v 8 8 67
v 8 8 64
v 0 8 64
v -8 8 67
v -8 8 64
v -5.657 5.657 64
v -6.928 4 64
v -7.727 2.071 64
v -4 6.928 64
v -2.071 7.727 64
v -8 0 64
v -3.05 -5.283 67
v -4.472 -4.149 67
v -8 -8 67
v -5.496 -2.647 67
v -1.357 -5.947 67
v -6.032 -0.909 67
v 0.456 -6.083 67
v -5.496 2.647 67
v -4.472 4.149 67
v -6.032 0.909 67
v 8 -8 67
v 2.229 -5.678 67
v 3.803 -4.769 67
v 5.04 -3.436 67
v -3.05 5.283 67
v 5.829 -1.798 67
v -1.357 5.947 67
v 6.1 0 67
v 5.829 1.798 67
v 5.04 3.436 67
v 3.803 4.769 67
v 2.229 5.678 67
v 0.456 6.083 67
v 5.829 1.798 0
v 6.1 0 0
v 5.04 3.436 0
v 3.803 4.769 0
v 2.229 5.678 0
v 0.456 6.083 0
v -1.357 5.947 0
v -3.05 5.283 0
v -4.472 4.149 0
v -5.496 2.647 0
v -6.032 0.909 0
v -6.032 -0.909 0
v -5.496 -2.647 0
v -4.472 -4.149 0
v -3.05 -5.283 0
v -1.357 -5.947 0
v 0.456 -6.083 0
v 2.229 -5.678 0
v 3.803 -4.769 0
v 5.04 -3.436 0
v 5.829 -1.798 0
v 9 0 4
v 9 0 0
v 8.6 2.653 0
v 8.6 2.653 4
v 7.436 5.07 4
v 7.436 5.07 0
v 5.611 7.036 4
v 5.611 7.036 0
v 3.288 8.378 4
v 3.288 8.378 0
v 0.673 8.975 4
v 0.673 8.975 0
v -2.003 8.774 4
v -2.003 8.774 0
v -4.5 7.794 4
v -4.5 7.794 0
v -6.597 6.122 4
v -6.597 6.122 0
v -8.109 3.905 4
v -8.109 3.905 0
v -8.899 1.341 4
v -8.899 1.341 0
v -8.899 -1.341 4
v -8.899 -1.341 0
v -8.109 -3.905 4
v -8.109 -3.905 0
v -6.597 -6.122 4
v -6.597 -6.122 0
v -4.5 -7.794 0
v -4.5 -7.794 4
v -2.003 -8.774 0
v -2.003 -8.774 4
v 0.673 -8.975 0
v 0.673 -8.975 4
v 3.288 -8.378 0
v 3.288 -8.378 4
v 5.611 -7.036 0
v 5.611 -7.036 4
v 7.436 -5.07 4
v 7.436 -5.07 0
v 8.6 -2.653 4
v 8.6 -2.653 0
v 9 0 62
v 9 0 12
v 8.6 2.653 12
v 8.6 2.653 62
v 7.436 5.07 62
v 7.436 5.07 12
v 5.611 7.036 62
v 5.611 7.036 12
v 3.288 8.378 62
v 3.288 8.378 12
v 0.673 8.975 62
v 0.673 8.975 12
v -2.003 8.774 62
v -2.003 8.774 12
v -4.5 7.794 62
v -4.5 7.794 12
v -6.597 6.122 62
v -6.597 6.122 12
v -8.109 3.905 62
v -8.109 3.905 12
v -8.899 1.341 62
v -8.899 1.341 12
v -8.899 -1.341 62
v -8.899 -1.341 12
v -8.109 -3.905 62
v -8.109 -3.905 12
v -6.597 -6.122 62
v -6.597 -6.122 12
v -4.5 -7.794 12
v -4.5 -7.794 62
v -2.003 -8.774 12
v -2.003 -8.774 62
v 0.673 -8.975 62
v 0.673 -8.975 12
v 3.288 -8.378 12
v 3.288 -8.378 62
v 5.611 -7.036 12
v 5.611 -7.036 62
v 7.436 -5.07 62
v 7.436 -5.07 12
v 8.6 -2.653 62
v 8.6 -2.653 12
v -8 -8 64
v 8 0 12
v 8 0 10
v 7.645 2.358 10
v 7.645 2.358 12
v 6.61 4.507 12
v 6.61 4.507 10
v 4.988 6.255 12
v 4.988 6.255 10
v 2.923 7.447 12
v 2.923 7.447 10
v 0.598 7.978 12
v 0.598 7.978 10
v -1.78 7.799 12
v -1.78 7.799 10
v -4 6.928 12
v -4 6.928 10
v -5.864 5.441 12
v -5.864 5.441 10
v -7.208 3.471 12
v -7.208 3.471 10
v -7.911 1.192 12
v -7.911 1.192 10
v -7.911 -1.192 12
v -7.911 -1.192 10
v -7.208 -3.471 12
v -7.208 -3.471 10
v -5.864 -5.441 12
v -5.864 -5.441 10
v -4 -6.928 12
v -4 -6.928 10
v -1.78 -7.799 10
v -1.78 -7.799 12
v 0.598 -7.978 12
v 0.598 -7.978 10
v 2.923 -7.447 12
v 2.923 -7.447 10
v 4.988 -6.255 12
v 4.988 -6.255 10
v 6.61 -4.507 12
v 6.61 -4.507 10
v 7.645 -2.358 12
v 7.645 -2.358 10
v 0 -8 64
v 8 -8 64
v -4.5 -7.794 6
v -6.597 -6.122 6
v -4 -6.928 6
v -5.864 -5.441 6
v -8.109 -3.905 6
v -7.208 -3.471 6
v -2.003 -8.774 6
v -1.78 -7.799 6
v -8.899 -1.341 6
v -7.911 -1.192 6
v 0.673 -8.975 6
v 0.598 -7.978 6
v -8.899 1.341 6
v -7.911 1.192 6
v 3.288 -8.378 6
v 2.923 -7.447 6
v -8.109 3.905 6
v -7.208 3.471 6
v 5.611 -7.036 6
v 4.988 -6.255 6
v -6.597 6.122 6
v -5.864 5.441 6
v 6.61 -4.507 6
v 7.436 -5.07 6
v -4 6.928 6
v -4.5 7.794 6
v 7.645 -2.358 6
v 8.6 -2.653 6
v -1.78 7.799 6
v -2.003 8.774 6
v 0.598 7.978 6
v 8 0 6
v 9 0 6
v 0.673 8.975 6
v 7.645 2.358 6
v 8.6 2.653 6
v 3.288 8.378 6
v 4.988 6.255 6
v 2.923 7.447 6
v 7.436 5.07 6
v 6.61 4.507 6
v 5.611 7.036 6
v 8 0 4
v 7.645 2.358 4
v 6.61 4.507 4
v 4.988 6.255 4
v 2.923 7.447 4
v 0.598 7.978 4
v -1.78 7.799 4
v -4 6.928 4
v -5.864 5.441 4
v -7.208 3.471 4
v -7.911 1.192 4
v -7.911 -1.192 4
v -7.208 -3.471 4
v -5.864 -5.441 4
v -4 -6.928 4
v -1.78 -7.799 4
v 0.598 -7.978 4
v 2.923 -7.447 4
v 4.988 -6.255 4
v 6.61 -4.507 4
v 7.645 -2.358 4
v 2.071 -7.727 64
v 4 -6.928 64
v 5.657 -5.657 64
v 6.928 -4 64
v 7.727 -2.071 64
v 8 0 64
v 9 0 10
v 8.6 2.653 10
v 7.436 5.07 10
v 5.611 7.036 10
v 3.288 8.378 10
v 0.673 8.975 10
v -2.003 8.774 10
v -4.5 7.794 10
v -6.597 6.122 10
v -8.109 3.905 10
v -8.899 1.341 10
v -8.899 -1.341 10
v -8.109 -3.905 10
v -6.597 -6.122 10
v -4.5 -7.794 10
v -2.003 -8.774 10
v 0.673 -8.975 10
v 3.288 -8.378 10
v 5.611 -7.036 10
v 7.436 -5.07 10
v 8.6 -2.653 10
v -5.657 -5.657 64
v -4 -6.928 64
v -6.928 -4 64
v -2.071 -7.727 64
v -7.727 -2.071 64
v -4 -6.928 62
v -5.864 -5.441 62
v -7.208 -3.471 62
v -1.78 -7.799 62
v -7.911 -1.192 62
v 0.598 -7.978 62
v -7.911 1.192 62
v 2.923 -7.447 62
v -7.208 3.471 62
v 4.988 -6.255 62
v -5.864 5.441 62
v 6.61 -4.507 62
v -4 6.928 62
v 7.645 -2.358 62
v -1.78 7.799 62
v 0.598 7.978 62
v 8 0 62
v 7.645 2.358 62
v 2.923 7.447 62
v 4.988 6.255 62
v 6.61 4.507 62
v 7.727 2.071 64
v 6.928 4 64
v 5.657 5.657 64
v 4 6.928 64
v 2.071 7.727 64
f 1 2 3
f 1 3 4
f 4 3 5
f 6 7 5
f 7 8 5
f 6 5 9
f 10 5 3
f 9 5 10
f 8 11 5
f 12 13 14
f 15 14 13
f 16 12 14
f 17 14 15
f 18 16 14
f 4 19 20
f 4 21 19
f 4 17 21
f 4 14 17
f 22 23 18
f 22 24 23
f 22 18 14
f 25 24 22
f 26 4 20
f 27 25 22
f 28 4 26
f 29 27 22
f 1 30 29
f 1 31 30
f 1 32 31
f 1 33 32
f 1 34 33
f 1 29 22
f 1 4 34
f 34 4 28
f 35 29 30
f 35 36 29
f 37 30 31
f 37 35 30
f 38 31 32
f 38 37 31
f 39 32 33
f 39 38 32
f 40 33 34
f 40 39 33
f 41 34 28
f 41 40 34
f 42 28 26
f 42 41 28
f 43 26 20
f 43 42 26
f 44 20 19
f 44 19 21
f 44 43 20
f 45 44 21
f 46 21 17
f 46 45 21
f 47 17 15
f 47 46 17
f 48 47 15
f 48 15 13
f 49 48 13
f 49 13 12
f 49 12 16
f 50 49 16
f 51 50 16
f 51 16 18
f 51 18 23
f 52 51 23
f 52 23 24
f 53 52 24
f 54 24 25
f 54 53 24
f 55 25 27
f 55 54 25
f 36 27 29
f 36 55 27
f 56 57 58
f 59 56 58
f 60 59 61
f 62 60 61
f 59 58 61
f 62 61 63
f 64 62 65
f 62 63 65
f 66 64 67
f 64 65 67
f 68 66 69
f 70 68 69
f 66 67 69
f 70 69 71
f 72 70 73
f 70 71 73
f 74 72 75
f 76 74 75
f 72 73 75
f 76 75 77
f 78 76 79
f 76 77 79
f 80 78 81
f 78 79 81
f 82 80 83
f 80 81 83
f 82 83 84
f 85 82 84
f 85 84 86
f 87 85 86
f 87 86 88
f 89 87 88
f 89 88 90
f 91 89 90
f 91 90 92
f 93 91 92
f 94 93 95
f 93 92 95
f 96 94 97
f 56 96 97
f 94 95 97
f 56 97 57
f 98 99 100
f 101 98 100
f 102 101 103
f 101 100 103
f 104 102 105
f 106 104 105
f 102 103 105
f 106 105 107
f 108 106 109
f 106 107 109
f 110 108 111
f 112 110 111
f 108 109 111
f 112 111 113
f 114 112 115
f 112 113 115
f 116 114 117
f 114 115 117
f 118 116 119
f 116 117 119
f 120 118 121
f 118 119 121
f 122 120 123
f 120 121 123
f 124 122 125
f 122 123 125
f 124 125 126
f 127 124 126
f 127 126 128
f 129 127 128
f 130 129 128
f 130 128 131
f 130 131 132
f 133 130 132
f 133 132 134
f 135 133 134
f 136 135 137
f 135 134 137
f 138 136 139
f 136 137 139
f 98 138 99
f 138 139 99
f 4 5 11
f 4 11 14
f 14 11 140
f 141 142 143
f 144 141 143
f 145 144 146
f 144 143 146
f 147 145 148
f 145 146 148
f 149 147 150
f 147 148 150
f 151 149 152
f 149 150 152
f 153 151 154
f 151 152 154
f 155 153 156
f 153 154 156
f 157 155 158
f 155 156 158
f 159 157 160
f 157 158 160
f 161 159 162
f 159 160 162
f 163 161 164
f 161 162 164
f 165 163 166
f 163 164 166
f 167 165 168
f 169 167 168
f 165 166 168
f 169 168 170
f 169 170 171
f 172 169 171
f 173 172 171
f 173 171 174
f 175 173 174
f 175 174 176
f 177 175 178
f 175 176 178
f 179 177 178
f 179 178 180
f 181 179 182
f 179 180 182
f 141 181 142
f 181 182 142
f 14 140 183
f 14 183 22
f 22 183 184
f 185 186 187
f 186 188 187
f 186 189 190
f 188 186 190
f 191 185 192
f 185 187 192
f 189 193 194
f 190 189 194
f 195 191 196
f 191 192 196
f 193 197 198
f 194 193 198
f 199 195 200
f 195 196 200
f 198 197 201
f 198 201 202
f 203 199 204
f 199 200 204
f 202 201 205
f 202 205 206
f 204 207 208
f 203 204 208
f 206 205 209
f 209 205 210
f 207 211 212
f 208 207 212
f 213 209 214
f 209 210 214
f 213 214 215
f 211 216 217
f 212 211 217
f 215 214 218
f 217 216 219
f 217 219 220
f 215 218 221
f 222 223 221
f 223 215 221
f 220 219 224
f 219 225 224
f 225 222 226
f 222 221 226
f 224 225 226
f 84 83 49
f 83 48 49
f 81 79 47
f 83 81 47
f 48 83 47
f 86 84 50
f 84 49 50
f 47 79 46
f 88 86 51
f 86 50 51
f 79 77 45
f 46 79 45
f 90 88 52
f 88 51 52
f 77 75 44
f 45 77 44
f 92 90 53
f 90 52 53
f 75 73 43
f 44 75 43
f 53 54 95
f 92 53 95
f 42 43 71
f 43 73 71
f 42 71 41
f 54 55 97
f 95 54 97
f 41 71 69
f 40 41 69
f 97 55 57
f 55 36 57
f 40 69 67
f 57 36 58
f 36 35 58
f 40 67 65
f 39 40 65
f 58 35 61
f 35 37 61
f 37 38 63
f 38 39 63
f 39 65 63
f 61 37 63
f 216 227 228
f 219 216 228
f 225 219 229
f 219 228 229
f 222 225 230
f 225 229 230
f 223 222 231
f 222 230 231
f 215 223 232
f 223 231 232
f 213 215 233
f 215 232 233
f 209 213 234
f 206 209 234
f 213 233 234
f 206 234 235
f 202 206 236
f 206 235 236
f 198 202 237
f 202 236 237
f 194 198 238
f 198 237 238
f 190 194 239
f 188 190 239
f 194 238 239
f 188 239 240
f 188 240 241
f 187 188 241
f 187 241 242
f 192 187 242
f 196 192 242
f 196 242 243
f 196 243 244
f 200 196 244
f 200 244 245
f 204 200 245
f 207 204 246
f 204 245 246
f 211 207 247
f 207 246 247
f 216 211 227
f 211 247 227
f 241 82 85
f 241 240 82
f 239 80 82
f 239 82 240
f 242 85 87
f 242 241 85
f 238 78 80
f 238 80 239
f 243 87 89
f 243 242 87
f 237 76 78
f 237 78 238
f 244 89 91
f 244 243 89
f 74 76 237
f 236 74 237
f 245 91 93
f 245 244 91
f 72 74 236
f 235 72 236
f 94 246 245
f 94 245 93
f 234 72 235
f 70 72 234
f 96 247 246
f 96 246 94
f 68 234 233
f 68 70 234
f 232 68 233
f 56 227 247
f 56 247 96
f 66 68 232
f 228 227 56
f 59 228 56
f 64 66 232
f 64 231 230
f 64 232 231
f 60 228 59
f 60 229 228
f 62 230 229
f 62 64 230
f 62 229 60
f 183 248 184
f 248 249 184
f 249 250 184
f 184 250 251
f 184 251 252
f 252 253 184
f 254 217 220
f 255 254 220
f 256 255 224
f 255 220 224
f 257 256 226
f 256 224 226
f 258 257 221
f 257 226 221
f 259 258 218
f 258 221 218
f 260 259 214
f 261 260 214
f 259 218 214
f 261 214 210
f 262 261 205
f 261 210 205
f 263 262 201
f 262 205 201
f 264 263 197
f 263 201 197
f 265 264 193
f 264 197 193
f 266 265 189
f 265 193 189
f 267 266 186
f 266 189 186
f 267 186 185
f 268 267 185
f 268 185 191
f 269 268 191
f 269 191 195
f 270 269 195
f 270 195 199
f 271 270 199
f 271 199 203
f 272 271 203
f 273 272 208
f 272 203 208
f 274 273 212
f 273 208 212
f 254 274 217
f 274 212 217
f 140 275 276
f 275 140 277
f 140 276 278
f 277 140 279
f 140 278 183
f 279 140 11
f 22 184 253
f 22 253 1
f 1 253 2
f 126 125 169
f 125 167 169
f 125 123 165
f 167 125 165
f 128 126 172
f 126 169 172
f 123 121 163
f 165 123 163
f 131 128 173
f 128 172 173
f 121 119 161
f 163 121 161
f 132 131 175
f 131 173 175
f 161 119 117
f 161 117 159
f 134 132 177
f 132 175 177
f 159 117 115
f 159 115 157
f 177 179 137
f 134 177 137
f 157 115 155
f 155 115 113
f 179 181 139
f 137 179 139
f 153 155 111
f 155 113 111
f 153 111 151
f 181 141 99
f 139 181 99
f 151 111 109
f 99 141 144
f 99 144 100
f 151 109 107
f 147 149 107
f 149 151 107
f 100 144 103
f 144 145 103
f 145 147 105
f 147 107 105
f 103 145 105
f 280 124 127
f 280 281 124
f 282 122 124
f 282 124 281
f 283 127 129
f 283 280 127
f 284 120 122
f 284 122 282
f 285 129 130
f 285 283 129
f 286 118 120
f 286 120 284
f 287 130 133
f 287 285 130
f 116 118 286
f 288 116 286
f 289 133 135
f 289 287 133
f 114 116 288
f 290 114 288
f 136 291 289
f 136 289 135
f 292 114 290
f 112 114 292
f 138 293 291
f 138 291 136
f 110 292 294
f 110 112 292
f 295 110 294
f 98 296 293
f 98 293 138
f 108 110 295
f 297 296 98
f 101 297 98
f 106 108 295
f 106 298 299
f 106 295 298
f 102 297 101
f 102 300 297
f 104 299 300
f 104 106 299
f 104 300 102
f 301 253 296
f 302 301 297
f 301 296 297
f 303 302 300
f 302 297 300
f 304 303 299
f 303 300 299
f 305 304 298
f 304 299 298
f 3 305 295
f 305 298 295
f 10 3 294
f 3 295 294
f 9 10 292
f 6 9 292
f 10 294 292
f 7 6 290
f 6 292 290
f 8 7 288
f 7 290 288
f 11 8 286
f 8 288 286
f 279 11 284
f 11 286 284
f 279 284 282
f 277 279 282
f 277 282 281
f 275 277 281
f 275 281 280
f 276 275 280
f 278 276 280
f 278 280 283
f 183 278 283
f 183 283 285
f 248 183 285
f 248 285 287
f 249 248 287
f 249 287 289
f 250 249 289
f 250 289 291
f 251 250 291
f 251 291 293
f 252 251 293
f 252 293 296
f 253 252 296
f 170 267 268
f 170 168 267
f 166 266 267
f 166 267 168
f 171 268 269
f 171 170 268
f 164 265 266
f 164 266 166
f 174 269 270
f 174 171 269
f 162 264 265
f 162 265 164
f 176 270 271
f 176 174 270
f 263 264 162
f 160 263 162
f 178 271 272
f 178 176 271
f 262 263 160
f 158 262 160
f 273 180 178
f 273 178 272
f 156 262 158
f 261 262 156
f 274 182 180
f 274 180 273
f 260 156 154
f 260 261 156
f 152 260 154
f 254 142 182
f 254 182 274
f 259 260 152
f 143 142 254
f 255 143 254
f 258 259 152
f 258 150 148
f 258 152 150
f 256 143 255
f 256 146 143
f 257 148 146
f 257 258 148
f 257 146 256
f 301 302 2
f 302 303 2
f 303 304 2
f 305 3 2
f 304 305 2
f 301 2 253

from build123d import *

# Parameters (mm, degrees)
F0_R      = 9
F0_R_2    = 6.1
F1_DEPTH  = 4
F2_R      = 8
F2_R_2    = 6.1
F3_DEPTH  = 2
F4_R      = 9
F4_R_2    = 8
F4_R_3    = 6.1
F5_DEPTH  = 4
F6_R      = 8
F6_R_2    = 6.1
F7_DEPTH  = 2
F8_R      = 9
F8_R_2    = 8
F8_R_3    = 6.1
F9_DEPTH  = 50
F10_R     = 8
F10_R_2   = 6.1
F11_DEPTH = 2
F12_R     = 6.1
F13_DEPTH = 3


with BuildPart() as f1:
    # F0 (on Top) → F1 (new body)
    with BuildSketch(Plane.XY):
        Circle(F0_R)
        Circle(F0_R_2, mode=Mode.SUBTRACT)
    extrude(amount=F1_DEPTH)

    # F2 (on face) → F3 (join)
    with BuildSketch(Plane.XY.offset(4)):
        Circle(F2_R)
        Circle(F2_R_2, mode=Mode.SUBTRACT)
    extrude(amount=F3_DEPTH)

    # F4 (on face) → F5 (join)
    with BuildSketch(Plane.XY.offset(6)):
        Circle(F4_R)
        Circle(F4_R_2, mode=Mode.SUBTRACT)
        Circle(F4_R_2)
        Circle(F4_R_3, mode=Mode.SUBTRACT)
    extrude(amount=F5_DEPTH)

    # F6 (on face) → F7 (join)
    with BuildSketch(Plane.XY.offset(10)):
        Circle(F6_R)
        Circle(F6_R_2, mode=Mode.SUBTRACT)
    extrude(amount=F7_DEPTH)

    # F8 (on face) → F9 (join)
    with BuildSketch(Plane.XY.offset(12)):
        Circle(F8_R)
        Circle(F8_R_2, mode=Mode.SUBTRACT)
        Circle(F8_R_2)
        Circle(F8_R_3, mode=Mode.SUBTRACT)
    extrude(amount=F9_DEPTH)

    # F10 (on face) → F11 (join)
    with BuildSketch(Plane.XY.offset(62)):
        Circle(F10_R)
        Circle(F10_R_2, mode=Mode.SUBTRACT)
    extrude(amount=F11_DEPTH)

    # F12 (on face) → F13 (join)
    with BuildSketch(Plane.XY.offset(64)):
        with BuildLine():
            ThreePointArc((8, 0), (5.6568542495, 5.6568542495), (0, 8))
            ThreePointArc((0, 8), (-5.6568542495, 5.6568542495), (-8, 0))
            ThreePointArc((-8, 0), (-5.6568542495, -5.6568542495), (0, -8))
            ThreePointArc((0, -8), (5.6568542495, -5.6568542495), (8, 0))
        make_face()
        Circle(F12_R, mode=Mode.SUBTRACT)
        with BuildLine():
            Line((0, 8), (-8, 8))
            Line((-8, 8), (-8, 0))
            ThreePointArc((-8, 0), (-5.6568542495, 5.6568542495), (0, 8))
        make_face()
        with BuildLine():
            ThreePointArc((0, -8), (-5.6568542495, -5.6568542495), (-8, 0))
            Line((-8, 0), (-8, -8))
            Line((-8, -8), (0, -8))
        make_face()
        with BuildLine():
            Line((8, -8), (8, 0))
            ThreePointArc((8, 0), (5.6568542495, -5.6568542495), (0, -8))
            Line((0, -8), (8, -8))
        make_face()
        with BuildLine():
            Line((8, 8), (0, 8))
            ThreePointArc((0, 8), (5.6568542495, 5.6568542495), (8, 0))
            Line((8, 0), (8, 8))
        make_face()
    extrude(amount=F13_DEPTH)


solid = f1.part
